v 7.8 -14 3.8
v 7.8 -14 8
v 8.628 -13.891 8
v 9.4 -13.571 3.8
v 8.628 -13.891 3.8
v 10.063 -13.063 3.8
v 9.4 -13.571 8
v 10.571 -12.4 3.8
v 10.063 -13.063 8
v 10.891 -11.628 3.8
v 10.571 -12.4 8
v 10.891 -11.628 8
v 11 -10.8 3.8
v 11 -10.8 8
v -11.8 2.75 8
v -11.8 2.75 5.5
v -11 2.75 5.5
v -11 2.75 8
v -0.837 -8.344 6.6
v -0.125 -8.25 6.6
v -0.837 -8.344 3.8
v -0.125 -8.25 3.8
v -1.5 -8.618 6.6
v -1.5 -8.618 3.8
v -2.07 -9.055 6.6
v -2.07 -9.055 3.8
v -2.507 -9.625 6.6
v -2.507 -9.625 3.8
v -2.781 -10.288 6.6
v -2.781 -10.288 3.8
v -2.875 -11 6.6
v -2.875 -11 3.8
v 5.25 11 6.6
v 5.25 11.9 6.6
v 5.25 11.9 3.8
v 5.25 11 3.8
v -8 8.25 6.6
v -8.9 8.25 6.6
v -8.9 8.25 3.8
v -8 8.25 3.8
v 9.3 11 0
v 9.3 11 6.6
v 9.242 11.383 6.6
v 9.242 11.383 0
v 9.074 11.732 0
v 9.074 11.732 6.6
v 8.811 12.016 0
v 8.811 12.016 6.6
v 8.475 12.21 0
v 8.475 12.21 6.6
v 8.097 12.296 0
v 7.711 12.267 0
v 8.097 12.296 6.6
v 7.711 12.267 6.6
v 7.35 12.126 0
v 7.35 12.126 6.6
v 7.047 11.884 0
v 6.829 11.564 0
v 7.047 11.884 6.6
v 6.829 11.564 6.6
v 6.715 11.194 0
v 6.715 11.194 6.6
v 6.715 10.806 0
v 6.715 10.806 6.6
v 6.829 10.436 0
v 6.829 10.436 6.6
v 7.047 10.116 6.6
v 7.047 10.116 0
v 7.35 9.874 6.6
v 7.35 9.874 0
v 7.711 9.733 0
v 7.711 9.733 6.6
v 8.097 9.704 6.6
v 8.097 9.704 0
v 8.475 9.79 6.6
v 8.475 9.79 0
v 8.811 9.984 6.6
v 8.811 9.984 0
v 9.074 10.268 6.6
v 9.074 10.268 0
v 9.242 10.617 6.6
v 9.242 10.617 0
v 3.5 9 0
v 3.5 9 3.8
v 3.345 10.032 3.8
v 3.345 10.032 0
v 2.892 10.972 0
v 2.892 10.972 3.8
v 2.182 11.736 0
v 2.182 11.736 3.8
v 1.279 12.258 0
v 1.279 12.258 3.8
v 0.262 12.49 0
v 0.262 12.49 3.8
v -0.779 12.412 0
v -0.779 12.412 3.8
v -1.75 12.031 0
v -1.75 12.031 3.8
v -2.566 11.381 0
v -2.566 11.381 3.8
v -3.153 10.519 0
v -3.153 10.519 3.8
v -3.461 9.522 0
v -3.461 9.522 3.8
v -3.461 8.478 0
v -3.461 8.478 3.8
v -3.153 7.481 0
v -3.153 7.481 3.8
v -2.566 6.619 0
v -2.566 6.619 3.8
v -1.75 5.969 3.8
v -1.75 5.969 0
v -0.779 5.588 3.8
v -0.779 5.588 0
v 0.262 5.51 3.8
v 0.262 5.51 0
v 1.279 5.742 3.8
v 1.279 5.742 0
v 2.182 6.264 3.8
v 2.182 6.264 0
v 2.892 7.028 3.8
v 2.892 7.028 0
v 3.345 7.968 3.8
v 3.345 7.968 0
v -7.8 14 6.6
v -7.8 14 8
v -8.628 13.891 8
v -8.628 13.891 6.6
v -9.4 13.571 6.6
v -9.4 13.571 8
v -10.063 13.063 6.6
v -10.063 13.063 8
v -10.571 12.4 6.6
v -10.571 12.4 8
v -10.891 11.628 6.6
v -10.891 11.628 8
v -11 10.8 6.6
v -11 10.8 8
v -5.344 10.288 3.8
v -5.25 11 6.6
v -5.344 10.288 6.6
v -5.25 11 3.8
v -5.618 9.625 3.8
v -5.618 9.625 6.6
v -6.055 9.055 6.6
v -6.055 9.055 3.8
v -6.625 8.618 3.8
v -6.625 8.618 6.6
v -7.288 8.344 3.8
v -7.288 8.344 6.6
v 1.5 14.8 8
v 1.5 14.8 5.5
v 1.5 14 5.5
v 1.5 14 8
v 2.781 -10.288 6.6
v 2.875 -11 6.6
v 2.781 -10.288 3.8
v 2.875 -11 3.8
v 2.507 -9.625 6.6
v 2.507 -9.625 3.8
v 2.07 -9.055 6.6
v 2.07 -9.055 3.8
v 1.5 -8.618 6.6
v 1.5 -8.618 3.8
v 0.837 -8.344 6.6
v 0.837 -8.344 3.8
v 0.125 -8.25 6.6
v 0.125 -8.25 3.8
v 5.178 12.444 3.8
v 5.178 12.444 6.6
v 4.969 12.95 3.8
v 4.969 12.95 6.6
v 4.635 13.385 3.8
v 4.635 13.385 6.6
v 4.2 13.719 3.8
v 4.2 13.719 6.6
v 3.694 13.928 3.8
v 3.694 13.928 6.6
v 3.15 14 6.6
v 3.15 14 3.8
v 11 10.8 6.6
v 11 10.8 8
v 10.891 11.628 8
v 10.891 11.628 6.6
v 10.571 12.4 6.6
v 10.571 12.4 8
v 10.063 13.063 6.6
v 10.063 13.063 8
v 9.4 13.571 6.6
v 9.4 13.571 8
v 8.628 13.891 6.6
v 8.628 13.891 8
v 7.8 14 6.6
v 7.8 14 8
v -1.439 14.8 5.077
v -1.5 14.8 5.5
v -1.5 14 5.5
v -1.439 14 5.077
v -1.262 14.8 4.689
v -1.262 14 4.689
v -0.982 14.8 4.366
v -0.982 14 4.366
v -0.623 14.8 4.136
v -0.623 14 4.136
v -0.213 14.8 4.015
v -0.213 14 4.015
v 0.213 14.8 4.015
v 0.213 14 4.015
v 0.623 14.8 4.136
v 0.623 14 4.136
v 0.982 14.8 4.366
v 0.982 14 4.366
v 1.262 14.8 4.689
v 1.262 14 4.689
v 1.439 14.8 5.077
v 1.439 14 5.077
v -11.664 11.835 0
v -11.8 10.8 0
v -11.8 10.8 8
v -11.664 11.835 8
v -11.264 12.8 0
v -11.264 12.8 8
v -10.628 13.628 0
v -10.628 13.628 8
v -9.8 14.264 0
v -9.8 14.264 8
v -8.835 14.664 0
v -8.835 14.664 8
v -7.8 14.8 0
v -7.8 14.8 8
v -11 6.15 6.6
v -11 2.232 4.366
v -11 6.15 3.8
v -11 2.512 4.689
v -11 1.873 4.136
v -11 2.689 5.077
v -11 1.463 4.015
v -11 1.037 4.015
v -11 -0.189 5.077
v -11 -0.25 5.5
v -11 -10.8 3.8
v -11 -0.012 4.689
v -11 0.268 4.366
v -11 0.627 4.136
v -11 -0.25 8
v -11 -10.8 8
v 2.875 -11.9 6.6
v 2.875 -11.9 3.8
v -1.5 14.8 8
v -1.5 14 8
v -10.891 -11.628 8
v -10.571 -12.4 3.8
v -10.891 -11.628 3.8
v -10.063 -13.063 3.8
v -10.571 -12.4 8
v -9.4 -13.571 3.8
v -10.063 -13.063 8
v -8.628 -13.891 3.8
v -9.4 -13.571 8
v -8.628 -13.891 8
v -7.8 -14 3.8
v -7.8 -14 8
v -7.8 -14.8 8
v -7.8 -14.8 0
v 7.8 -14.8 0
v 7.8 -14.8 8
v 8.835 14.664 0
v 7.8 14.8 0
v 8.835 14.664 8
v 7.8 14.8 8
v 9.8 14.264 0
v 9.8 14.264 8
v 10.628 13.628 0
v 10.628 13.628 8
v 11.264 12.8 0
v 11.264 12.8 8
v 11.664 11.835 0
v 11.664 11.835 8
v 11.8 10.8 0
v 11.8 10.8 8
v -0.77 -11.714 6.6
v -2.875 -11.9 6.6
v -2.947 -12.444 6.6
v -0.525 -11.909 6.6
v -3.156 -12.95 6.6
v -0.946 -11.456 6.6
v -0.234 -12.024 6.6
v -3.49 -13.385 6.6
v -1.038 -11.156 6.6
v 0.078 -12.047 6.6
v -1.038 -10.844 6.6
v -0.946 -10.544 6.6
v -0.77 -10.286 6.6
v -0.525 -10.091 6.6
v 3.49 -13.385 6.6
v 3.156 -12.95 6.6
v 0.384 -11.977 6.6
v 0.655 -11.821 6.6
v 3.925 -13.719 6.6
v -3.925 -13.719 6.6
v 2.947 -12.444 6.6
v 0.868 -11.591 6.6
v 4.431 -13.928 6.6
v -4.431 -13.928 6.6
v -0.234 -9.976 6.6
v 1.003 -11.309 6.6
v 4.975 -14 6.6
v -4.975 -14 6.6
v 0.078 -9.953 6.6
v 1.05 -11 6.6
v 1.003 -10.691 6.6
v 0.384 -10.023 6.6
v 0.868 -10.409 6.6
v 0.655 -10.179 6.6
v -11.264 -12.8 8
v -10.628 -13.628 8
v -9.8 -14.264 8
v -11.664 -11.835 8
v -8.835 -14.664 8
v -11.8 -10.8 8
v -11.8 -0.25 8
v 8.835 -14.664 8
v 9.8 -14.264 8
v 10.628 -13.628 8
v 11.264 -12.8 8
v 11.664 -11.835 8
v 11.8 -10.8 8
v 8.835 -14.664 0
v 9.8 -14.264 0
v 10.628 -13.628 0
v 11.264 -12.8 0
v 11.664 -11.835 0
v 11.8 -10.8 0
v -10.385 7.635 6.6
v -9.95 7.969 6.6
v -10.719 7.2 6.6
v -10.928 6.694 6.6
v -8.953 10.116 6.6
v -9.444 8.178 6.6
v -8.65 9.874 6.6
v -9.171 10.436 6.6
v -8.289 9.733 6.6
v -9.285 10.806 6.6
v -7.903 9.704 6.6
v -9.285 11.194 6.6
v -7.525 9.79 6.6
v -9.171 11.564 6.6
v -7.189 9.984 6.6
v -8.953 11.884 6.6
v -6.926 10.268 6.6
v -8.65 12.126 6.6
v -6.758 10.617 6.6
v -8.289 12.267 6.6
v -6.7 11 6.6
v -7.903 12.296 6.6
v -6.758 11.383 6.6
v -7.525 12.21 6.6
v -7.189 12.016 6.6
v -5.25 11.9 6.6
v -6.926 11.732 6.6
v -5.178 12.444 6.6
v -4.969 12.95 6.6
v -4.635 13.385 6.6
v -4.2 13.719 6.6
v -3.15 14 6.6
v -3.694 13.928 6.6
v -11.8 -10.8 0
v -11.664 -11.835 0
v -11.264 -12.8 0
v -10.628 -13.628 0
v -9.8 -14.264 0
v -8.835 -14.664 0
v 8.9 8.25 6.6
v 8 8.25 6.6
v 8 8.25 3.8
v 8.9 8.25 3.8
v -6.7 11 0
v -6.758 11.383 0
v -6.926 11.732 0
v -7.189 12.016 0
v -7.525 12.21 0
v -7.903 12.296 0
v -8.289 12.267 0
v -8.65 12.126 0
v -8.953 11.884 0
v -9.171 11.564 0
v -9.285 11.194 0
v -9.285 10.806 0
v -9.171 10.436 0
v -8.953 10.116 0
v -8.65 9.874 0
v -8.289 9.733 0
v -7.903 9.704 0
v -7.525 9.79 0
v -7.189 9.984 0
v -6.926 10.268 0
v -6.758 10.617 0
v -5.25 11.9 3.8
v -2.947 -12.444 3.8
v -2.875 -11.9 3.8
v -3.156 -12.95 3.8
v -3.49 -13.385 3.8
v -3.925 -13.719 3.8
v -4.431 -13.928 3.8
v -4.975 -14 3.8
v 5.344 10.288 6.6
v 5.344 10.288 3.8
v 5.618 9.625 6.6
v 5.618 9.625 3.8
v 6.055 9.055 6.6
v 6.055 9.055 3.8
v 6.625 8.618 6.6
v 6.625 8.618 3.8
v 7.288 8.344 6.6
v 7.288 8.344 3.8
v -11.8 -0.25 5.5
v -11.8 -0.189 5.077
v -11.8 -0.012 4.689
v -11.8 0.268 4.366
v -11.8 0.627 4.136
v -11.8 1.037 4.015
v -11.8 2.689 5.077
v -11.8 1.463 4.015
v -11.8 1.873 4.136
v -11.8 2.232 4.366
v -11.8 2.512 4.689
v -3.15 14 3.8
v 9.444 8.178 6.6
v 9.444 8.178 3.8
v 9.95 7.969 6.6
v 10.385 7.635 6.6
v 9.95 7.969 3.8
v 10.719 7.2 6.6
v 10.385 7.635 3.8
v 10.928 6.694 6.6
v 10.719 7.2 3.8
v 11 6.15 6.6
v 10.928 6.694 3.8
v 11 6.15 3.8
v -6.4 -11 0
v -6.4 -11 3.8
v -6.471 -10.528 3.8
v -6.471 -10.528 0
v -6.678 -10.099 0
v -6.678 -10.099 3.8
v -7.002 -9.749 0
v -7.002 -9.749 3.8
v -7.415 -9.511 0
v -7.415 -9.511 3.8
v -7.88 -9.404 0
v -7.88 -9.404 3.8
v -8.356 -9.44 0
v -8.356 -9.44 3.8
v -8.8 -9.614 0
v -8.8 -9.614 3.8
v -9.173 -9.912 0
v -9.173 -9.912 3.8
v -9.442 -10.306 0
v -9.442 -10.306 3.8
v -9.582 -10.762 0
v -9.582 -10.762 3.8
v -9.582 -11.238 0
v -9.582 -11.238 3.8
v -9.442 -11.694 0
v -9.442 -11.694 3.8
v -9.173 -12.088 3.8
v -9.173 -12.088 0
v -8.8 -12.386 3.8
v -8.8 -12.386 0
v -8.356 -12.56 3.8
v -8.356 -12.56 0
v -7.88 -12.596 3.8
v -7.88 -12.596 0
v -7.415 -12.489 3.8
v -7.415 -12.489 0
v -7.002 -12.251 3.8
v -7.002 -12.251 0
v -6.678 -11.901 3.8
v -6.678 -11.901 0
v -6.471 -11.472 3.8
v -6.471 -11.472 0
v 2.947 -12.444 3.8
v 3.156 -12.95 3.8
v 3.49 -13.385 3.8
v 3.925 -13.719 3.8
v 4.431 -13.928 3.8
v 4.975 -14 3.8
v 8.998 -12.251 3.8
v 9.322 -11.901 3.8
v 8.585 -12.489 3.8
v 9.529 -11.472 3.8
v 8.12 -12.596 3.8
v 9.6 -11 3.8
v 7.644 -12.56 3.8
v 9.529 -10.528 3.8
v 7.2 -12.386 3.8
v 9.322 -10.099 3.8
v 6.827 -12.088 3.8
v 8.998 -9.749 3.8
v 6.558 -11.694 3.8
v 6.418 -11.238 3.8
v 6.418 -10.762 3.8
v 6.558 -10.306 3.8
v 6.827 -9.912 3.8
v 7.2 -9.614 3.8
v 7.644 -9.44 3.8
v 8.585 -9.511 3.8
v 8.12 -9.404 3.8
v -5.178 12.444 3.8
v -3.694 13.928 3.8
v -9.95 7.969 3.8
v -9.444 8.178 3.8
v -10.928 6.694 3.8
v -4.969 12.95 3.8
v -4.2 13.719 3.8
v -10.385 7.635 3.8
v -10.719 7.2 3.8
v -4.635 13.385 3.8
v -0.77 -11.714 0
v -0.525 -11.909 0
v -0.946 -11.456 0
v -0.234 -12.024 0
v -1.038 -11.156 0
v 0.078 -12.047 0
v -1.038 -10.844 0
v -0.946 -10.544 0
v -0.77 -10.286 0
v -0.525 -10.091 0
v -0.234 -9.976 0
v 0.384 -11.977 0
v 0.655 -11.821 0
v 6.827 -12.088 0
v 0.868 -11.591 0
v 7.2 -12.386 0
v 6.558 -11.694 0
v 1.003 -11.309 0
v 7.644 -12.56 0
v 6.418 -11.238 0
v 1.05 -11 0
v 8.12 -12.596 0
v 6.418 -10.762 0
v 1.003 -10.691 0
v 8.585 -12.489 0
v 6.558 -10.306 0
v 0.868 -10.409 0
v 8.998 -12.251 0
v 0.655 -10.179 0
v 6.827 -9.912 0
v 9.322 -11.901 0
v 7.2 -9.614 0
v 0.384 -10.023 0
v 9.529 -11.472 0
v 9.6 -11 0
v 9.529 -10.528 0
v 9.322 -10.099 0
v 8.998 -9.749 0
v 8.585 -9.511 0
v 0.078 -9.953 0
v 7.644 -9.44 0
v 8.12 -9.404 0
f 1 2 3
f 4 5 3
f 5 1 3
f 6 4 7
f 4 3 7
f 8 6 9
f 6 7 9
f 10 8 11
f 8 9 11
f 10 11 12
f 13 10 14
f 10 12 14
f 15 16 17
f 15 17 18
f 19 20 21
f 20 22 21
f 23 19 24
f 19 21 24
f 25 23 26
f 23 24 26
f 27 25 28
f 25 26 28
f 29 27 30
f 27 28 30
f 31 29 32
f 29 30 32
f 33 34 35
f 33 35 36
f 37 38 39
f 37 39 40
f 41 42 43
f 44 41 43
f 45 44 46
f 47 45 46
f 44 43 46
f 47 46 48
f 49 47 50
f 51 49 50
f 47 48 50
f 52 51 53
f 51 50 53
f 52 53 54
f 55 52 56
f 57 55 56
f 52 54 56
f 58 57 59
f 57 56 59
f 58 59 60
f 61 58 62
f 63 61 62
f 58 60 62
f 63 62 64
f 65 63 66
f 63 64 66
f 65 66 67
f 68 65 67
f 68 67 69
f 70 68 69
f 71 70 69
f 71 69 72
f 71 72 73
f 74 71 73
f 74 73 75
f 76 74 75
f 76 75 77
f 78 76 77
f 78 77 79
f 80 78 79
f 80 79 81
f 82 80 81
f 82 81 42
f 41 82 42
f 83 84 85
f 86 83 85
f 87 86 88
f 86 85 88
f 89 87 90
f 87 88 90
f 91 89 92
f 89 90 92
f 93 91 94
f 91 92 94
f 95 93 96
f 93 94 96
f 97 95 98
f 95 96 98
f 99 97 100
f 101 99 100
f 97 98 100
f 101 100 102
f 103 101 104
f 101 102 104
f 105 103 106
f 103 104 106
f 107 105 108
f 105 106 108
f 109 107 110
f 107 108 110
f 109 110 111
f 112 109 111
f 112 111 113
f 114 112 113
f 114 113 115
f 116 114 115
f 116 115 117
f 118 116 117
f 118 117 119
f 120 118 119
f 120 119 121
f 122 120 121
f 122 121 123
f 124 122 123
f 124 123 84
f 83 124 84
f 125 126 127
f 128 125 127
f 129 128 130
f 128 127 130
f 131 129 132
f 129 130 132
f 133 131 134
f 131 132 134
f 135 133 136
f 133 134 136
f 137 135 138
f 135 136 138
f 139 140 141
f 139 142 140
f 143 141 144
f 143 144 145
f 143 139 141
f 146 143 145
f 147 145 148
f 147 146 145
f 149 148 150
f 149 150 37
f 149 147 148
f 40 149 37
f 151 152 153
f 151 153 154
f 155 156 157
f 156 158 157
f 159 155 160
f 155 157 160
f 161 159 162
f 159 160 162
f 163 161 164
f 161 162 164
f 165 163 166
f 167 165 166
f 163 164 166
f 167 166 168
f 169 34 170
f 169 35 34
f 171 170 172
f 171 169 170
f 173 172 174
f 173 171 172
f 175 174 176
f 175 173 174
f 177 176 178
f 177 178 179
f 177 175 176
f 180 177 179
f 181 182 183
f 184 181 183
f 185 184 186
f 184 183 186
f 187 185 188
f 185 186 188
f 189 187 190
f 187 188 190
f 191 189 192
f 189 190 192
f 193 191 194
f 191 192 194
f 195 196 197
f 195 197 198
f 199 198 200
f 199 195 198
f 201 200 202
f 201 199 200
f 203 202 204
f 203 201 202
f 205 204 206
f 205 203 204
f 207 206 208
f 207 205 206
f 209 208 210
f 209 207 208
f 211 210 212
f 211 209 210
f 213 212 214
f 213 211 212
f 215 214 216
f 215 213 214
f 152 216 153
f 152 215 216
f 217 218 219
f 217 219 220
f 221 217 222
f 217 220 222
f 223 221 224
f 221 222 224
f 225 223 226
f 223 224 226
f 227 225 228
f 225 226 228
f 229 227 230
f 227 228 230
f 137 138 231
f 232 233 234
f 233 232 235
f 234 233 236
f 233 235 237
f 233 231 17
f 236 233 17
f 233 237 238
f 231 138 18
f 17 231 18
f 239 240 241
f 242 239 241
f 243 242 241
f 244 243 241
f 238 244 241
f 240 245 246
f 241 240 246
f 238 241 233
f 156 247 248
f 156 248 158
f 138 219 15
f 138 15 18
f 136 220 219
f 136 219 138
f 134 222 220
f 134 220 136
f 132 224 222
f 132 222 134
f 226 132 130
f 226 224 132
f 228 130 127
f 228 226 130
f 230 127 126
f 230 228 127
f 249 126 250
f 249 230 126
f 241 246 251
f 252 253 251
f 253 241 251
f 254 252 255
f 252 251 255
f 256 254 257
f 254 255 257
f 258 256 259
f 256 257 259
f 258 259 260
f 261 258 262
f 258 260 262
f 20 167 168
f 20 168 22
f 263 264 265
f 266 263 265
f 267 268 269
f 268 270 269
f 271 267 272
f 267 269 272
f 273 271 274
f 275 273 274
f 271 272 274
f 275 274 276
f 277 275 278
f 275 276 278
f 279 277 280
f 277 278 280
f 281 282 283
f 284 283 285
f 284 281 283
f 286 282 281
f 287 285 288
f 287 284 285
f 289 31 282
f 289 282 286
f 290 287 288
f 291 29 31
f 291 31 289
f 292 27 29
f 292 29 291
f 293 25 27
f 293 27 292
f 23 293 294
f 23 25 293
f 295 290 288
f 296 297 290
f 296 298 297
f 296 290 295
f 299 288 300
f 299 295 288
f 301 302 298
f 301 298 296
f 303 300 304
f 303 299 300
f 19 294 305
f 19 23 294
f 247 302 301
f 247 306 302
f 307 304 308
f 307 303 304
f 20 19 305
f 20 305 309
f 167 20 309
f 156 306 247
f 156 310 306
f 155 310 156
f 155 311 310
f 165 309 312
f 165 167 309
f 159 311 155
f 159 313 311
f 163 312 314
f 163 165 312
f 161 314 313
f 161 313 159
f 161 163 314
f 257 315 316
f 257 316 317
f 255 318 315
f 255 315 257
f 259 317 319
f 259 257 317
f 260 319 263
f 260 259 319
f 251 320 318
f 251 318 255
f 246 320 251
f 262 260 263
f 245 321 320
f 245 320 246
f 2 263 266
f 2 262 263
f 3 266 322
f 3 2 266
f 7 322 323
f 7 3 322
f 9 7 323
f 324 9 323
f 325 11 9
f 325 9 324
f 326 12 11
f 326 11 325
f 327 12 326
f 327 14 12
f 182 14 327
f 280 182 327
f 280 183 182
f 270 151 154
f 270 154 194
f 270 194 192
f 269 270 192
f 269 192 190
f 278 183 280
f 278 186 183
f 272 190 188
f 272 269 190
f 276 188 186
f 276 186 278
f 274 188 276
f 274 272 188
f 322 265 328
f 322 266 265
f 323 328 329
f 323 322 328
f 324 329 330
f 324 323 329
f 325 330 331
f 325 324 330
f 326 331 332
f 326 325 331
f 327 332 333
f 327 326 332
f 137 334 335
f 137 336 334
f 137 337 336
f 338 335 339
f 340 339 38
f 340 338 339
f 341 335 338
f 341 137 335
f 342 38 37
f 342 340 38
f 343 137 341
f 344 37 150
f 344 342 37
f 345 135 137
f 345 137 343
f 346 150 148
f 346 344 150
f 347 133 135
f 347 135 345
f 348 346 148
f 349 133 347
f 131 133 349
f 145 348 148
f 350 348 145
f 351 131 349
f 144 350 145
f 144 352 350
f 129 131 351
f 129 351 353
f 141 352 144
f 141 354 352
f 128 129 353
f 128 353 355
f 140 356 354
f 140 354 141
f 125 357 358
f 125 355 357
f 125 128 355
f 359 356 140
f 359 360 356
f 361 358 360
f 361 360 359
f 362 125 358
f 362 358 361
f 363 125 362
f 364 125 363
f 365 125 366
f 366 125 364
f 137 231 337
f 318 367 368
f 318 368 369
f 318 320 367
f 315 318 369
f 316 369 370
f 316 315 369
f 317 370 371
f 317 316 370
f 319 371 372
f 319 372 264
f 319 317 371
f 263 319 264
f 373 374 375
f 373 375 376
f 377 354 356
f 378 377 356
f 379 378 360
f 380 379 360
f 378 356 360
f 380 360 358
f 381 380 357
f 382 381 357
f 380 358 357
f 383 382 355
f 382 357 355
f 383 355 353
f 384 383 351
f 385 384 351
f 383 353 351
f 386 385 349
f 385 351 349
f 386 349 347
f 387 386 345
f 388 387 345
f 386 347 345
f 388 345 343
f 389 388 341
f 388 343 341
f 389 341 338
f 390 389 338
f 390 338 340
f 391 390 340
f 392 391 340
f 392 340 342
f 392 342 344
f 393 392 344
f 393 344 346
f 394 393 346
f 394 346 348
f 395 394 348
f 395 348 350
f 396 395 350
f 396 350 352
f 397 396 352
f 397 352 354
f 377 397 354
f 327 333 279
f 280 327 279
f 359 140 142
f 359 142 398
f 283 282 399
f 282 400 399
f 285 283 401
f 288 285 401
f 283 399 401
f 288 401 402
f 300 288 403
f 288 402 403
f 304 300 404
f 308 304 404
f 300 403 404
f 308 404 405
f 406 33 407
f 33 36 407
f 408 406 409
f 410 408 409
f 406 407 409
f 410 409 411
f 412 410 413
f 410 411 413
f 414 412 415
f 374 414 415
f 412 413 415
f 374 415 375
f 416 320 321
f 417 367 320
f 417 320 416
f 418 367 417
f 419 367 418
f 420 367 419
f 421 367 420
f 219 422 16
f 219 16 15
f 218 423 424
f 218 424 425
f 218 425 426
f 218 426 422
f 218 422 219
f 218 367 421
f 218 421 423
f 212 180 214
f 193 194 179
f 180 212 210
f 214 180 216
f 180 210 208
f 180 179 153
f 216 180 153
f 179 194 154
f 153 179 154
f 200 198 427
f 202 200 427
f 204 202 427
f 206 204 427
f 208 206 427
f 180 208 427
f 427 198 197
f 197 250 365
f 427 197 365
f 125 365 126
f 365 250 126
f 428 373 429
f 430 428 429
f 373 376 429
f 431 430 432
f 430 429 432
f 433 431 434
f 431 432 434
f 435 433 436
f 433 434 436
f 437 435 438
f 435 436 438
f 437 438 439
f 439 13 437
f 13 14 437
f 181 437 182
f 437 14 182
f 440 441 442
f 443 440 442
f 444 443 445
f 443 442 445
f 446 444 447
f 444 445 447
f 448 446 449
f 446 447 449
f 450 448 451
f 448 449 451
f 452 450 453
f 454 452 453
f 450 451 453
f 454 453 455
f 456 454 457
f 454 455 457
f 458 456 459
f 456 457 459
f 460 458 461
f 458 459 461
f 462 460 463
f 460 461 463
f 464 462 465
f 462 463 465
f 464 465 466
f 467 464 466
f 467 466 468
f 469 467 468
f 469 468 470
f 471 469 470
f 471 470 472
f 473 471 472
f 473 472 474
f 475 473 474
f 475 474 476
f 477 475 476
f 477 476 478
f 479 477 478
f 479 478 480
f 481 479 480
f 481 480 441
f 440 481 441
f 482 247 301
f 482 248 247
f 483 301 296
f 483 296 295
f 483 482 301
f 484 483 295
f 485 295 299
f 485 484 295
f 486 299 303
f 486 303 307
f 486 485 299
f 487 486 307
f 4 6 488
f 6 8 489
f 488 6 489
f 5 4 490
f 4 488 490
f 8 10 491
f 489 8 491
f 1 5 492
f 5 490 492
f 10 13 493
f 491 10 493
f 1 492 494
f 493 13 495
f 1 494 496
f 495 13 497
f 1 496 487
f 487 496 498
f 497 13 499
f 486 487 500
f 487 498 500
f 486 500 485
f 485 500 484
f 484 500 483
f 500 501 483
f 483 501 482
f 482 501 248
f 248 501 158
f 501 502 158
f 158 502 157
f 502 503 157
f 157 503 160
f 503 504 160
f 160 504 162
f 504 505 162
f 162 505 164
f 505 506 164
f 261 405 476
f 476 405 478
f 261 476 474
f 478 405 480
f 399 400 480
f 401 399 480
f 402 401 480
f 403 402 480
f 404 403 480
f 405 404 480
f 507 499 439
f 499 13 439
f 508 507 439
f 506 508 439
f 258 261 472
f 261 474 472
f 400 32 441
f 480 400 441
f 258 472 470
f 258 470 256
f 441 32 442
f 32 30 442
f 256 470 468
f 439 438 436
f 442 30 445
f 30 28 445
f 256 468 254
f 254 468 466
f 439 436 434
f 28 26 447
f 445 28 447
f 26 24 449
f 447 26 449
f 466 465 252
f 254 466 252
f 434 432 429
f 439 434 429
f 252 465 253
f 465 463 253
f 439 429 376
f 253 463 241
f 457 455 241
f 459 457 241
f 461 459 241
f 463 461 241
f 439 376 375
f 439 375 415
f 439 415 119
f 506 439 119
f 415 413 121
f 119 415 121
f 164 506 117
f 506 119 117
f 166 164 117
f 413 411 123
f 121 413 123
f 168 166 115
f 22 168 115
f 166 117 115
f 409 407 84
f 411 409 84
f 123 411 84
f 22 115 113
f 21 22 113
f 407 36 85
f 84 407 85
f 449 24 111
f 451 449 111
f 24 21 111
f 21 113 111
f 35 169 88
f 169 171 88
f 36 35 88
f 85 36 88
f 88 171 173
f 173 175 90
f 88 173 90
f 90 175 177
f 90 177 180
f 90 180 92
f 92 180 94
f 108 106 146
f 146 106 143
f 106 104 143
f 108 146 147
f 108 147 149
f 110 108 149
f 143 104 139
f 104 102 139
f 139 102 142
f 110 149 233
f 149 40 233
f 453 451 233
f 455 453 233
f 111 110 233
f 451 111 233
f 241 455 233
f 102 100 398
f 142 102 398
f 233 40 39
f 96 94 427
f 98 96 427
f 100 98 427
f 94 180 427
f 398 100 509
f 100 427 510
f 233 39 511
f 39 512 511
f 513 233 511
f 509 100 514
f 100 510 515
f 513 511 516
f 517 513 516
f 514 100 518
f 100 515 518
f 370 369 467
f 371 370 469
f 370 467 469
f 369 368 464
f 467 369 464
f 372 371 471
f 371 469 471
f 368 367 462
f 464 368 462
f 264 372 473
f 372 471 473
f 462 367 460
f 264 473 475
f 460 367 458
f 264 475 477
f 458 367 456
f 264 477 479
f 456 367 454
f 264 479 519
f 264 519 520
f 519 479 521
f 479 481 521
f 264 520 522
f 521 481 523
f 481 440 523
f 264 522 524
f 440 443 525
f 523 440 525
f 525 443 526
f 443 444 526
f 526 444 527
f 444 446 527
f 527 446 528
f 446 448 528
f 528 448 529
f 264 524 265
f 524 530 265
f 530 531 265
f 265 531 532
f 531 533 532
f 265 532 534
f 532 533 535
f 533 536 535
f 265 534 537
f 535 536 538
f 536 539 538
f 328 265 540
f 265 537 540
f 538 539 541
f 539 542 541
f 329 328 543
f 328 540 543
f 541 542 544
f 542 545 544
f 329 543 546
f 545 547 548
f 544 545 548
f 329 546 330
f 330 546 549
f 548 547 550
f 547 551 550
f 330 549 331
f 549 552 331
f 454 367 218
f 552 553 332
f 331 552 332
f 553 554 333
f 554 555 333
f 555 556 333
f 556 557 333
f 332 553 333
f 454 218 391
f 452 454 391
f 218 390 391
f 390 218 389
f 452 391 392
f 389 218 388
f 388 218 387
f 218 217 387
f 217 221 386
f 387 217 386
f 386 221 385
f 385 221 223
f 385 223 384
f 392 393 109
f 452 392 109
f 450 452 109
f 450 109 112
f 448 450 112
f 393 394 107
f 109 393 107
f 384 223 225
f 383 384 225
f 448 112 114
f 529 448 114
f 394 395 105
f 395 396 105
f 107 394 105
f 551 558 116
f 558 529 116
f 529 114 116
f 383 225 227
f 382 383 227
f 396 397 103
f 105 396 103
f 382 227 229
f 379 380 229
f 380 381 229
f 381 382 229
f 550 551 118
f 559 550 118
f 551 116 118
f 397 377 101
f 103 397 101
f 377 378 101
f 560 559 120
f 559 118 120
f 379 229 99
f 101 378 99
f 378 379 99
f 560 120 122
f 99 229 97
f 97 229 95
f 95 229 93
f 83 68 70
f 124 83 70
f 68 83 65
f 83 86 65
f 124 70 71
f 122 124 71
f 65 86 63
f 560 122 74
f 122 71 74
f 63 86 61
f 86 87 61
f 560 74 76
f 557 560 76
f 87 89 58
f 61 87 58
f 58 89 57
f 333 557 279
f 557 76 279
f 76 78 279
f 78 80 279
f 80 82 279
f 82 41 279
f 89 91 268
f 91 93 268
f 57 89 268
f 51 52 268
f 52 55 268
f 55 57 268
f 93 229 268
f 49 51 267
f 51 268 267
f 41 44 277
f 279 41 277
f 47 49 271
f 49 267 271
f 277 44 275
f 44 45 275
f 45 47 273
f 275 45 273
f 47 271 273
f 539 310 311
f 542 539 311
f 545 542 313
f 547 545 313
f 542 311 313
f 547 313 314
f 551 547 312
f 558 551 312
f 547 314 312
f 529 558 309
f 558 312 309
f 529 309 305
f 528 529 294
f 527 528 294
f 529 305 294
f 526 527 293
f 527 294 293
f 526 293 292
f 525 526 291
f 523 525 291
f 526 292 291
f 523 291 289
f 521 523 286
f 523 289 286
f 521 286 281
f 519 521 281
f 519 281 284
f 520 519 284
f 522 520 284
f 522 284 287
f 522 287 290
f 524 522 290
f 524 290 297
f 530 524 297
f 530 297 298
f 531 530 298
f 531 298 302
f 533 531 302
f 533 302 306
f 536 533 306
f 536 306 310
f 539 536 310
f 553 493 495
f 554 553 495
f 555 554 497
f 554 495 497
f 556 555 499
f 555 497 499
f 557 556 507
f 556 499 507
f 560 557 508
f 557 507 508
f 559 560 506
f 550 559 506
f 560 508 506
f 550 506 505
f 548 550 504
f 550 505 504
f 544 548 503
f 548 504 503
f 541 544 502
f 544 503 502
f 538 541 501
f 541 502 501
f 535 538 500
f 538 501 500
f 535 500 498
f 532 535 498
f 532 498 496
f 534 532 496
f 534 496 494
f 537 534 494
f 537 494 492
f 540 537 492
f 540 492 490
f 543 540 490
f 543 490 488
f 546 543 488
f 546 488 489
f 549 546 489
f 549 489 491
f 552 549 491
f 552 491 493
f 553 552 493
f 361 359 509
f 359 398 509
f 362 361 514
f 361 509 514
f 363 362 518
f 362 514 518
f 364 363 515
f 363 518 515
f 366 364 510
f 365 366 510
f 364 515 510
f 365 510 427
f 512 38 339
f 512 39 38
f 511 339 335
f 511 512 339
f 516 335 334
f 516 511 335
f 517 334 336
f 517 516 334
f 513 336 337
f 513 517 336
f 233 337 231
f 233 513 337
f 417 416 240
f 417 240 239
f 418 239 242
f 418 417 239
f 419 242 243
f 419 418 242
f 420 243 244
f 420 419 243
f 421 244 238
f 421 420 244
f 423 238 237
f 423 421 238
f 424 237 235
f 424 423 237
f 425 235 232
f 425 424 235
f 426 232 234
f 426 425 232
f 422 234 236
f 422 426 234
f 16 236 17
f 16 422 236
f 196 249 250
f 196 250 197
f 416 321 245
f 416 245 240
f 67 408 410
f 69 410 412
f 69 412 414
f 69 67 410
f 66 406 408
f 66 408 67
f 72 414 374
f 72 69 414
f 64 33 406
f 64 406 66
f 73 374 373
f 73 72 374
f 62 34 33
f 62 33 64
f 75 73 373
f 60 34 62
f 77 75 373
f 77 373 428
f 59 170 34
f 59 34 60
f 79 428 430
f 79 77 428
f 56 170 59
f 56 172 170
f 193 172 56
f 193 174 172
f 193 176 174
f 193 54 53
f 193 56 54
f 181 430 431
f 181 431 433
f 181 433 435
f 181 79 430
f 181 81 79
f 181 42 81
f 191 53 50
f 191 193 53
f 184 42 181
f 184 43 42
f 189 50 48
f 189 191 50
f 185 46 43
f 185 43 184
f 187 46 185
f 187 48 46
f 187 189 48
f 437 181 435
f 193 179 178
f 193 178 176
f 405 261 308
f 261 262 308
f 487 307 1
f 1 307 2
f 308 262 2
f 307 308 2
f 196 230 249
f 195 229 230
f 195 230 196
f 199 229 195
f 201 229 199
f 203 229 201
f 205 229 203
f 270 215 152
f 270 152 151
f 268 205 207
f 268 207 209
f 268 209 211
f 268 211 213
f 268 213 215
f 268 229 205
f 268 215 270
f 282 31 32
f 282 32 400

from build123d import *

# Parameters (mm, degrees)
SKETCH1_W                               = 23.6
SKETCH1_H                               = 29.6
BASIC_DEPTH                             = 8
SKETCH2_R                               = 3.5
F_7_0_HOLE_ROTATING_MAGNET_DEPTH        = 21.549452547
SKETCH4_R                               = 1.6
SKETCH4_R_2                             = 1.3
MOUNTING_HOLES_2_05_2_5_DEPTH           = 21.549452547
R4_BASIC_R                              = 4
PCB_LEVEL_DEPTH                         = 1.4
PCB_CLEARANCE_DEPTH                     = 4.2
R2_1_PCB_CLEARANCE_R                    = 2.1
R2_75_PCB_CLEARANCE_R                   = 2.75
CUT_OUT_1_DEPTH                         = 0.8
CUT_OUT_RESET_SWITCH_DEPTH              = 0.8
SKETCH13_R                              = 1.05
F_2_05_PCB_MOUNTING_HOLE_FOR_M2_5_DEPTH = 21.045947221


with BuildPart() as part:
    # Sketch1 → Basic (new body)
    with BuildSketch(Plane.XY):
        Rectangle(SKETCH1_W, SKETCH1_H)
    extrude(amount=BASIC_DEPTH)

    # Sketch2 → Ø7.0 Hole (Rotating Magnet) (cut, through all)
    with BuildSketch(Plane.XY.offset(8)):
        with Locations((0, 9)):
            Circle(SKETCH2_R)
    extrude(amount=-F_7_0_HOLE_ROTATING_MAGNET_DEPTH, mode=Mode.SUBTRACT)

    # Sketch4 → Mounting holes  Ø2.05 & Ø2.5 (cut, through all)
    with BuildSketch(Plane.XY.offset(8)):
        with Locations((8, -11)):
            Circle(SKETCH4_R)
        with Locations((-8, -11)):
            Circle(SKETCH4_R)
        with Locations((8, 11)):
            Circle(SKETCH4_R_2)
        with Locations((-8, 11)):
            Circle(SKETCH4_R_2)
    extrude(amount=-MOUNTING_HOLES_2_05_2_5_DEPTH, mode=Mode.SUBTRACT)

    # R4: Basic
    r4_basic_edges = [part.edges().sort_by_distance(p)[0] for p in [
        (11.8, -14.8, 4),
        (-11.8, -14.8, 4),
        (-11.8, 14.8, 4),
        (11.8, 14.8, 4),
    ]]
    fillet(r4_basic_edges, radius=R4_BASIC_R)

    # Sketch6 → PCB level (cut)
    with BuildSketch(Plane.XY.offset(8)):
        with BuildLine():
            Line((11, -10.8), (11, 10.8))
            ThreePointArc((11, 10.8), (10.0627417, 13.0627417), (7.8, 14))
            Line((7.8, 14), (-7.8, 14))
            ThreePointArc((-7.8, 14), (-10.0627417, 13.0627417), (-11, 10.8))
            Line((-11, 10.8), (-11, -10.8))
            ThreePointArc((-11, -10.8), (-10.0627417, -13.0627417), (-7.8, -14))
            Line((-7.8, -14), (7.8, -14))
            ThreePointArc((7.8, -14), (10.0627417, -13.0627417), (11, -10.8))
        make_face()
    extrude(amount=-PCB_LEVEL_DEPTH, mode=Mode.SUBTRACT)

    # Sketch9 → PCB Clearance (cut)
    with BuildSketch(Plane.XY.offset(8)):
        with BuildLine():
            Line((-11, 8.25), (-5.25, 8.25))
            Line((-5.25, 8.25), (-5.25, 14))
            Line((-5.25, 14), (5.25, 14))
            Line((5.25, 14), (5.25, 8.25))
            Line((5.25, 8.25), (11, 8.25))
            Line((11, 8.25), (11, -10.8))
            ThreePointArc((11, -10.8), (10.0627417, -13.0627417), (7.8, -14))
            Line((7.8, -14), (2.875, -14))
            Line((2.875, -14), (2.875, -8.25))
            Line((2.875, -8.25), (-2.875, -8.25))
            Line((-2.875, -8.25), (-2.875, -14))
            Line((-2.875, -14), (-7.8, -14))
            ThreePointArc((-7.8, -14), (-10.0627417, -13.0627417), (-11, -10.8))
            Line((-11, -10.8), (-11, 8.25))
        make_face()
    extrude(amount=-PCB_CLEARANCE_DEPTH, mode=Mode.SUBTRACT)

    # R2.1: PCB Clearance
    r2_1_pcb_clearance_edges = [part.edges().sort_by_distance(p)[0] for p in [
        (-11, 8.25, 5.2),
        (-5.25, 14, 5.2),
        (5.25, 14, 5.2),
        (11, 8.25, 5.2),
        (2.875, -14, 5.2),
        (-2.875, -14, 5.2),
    ]]
    fillet(r2_1_pcb_clearance_edges, radius=R2_1_PCB_CLEARANCE_R)

    # R2.75: PCB Clearance
    r2_75_pcb_clearance_edges = [part.edges().sort_by_distance(p)[0] for p in [
        (-5.25, 8.25, 5.2),
        (5.25, 8.25, 5.2),
        (2.875, -8.25, 5.2),
        (-2.875, -8.25, 5.2),
    ]]
    fillet(r2_75_pcb_clearance_edges, radius=R2_75_PCB_CLEARANCE_R)

    # Sketch11 → Cut-Out (1) (cut)
    with BuildSketch(Plane(origin=(0, 14.8, 0), x_dir=(1, 0, 0), z_dir=(0, 1, 0))):
        with BuildLine():
            Line((-1.5, -8), (-1.5, -5.5))
            ThreePointArc((-1.5, -5.5), (0, -4), (1.5, -5.5))
            Line((1.5, -5.5), (1.5, -8))
            Line((1.5, -8), (-1.5, -8))
        make_face()
    extrude(amount=-CUT_OUT_1_DEPTH, mode=Mode.SUBTRACT)

    # Sketch12 → Cut-Out Reset Switch (cut)
    with BuildSketch(Plane.ZY.offset(11.8)):
        with BuildLine():
            Line((8, -0.25), (5.5, -0.25))
            ThreePointArc((5.5, -0.25), (4, 1.25), (5.5, 2.75))
            Line((5.5, 2.75), (8, 2.75))
            Line((8, 2.75), (8, -0.25))
        make_face()
    extrude(amount=-CUT_OUT_RESET_SWITCH_DEPTH, mode=Mode.SUBTRACT)

    # Sketch13 → Ø2.05 PCB Mounting Hole for M2.5 (cut, through all)
    with BuildSketch(Plane.XY.offset(6.6)):
        with Locations((0, -11)):
            Circle(SKETCH13_R)
    extrude(amount=-F_2_05_PCB_MOUNTING_HOLE_FOR_M2_5_DEPTH, mode=Mode.SUBTRACT)


solid = part.part
